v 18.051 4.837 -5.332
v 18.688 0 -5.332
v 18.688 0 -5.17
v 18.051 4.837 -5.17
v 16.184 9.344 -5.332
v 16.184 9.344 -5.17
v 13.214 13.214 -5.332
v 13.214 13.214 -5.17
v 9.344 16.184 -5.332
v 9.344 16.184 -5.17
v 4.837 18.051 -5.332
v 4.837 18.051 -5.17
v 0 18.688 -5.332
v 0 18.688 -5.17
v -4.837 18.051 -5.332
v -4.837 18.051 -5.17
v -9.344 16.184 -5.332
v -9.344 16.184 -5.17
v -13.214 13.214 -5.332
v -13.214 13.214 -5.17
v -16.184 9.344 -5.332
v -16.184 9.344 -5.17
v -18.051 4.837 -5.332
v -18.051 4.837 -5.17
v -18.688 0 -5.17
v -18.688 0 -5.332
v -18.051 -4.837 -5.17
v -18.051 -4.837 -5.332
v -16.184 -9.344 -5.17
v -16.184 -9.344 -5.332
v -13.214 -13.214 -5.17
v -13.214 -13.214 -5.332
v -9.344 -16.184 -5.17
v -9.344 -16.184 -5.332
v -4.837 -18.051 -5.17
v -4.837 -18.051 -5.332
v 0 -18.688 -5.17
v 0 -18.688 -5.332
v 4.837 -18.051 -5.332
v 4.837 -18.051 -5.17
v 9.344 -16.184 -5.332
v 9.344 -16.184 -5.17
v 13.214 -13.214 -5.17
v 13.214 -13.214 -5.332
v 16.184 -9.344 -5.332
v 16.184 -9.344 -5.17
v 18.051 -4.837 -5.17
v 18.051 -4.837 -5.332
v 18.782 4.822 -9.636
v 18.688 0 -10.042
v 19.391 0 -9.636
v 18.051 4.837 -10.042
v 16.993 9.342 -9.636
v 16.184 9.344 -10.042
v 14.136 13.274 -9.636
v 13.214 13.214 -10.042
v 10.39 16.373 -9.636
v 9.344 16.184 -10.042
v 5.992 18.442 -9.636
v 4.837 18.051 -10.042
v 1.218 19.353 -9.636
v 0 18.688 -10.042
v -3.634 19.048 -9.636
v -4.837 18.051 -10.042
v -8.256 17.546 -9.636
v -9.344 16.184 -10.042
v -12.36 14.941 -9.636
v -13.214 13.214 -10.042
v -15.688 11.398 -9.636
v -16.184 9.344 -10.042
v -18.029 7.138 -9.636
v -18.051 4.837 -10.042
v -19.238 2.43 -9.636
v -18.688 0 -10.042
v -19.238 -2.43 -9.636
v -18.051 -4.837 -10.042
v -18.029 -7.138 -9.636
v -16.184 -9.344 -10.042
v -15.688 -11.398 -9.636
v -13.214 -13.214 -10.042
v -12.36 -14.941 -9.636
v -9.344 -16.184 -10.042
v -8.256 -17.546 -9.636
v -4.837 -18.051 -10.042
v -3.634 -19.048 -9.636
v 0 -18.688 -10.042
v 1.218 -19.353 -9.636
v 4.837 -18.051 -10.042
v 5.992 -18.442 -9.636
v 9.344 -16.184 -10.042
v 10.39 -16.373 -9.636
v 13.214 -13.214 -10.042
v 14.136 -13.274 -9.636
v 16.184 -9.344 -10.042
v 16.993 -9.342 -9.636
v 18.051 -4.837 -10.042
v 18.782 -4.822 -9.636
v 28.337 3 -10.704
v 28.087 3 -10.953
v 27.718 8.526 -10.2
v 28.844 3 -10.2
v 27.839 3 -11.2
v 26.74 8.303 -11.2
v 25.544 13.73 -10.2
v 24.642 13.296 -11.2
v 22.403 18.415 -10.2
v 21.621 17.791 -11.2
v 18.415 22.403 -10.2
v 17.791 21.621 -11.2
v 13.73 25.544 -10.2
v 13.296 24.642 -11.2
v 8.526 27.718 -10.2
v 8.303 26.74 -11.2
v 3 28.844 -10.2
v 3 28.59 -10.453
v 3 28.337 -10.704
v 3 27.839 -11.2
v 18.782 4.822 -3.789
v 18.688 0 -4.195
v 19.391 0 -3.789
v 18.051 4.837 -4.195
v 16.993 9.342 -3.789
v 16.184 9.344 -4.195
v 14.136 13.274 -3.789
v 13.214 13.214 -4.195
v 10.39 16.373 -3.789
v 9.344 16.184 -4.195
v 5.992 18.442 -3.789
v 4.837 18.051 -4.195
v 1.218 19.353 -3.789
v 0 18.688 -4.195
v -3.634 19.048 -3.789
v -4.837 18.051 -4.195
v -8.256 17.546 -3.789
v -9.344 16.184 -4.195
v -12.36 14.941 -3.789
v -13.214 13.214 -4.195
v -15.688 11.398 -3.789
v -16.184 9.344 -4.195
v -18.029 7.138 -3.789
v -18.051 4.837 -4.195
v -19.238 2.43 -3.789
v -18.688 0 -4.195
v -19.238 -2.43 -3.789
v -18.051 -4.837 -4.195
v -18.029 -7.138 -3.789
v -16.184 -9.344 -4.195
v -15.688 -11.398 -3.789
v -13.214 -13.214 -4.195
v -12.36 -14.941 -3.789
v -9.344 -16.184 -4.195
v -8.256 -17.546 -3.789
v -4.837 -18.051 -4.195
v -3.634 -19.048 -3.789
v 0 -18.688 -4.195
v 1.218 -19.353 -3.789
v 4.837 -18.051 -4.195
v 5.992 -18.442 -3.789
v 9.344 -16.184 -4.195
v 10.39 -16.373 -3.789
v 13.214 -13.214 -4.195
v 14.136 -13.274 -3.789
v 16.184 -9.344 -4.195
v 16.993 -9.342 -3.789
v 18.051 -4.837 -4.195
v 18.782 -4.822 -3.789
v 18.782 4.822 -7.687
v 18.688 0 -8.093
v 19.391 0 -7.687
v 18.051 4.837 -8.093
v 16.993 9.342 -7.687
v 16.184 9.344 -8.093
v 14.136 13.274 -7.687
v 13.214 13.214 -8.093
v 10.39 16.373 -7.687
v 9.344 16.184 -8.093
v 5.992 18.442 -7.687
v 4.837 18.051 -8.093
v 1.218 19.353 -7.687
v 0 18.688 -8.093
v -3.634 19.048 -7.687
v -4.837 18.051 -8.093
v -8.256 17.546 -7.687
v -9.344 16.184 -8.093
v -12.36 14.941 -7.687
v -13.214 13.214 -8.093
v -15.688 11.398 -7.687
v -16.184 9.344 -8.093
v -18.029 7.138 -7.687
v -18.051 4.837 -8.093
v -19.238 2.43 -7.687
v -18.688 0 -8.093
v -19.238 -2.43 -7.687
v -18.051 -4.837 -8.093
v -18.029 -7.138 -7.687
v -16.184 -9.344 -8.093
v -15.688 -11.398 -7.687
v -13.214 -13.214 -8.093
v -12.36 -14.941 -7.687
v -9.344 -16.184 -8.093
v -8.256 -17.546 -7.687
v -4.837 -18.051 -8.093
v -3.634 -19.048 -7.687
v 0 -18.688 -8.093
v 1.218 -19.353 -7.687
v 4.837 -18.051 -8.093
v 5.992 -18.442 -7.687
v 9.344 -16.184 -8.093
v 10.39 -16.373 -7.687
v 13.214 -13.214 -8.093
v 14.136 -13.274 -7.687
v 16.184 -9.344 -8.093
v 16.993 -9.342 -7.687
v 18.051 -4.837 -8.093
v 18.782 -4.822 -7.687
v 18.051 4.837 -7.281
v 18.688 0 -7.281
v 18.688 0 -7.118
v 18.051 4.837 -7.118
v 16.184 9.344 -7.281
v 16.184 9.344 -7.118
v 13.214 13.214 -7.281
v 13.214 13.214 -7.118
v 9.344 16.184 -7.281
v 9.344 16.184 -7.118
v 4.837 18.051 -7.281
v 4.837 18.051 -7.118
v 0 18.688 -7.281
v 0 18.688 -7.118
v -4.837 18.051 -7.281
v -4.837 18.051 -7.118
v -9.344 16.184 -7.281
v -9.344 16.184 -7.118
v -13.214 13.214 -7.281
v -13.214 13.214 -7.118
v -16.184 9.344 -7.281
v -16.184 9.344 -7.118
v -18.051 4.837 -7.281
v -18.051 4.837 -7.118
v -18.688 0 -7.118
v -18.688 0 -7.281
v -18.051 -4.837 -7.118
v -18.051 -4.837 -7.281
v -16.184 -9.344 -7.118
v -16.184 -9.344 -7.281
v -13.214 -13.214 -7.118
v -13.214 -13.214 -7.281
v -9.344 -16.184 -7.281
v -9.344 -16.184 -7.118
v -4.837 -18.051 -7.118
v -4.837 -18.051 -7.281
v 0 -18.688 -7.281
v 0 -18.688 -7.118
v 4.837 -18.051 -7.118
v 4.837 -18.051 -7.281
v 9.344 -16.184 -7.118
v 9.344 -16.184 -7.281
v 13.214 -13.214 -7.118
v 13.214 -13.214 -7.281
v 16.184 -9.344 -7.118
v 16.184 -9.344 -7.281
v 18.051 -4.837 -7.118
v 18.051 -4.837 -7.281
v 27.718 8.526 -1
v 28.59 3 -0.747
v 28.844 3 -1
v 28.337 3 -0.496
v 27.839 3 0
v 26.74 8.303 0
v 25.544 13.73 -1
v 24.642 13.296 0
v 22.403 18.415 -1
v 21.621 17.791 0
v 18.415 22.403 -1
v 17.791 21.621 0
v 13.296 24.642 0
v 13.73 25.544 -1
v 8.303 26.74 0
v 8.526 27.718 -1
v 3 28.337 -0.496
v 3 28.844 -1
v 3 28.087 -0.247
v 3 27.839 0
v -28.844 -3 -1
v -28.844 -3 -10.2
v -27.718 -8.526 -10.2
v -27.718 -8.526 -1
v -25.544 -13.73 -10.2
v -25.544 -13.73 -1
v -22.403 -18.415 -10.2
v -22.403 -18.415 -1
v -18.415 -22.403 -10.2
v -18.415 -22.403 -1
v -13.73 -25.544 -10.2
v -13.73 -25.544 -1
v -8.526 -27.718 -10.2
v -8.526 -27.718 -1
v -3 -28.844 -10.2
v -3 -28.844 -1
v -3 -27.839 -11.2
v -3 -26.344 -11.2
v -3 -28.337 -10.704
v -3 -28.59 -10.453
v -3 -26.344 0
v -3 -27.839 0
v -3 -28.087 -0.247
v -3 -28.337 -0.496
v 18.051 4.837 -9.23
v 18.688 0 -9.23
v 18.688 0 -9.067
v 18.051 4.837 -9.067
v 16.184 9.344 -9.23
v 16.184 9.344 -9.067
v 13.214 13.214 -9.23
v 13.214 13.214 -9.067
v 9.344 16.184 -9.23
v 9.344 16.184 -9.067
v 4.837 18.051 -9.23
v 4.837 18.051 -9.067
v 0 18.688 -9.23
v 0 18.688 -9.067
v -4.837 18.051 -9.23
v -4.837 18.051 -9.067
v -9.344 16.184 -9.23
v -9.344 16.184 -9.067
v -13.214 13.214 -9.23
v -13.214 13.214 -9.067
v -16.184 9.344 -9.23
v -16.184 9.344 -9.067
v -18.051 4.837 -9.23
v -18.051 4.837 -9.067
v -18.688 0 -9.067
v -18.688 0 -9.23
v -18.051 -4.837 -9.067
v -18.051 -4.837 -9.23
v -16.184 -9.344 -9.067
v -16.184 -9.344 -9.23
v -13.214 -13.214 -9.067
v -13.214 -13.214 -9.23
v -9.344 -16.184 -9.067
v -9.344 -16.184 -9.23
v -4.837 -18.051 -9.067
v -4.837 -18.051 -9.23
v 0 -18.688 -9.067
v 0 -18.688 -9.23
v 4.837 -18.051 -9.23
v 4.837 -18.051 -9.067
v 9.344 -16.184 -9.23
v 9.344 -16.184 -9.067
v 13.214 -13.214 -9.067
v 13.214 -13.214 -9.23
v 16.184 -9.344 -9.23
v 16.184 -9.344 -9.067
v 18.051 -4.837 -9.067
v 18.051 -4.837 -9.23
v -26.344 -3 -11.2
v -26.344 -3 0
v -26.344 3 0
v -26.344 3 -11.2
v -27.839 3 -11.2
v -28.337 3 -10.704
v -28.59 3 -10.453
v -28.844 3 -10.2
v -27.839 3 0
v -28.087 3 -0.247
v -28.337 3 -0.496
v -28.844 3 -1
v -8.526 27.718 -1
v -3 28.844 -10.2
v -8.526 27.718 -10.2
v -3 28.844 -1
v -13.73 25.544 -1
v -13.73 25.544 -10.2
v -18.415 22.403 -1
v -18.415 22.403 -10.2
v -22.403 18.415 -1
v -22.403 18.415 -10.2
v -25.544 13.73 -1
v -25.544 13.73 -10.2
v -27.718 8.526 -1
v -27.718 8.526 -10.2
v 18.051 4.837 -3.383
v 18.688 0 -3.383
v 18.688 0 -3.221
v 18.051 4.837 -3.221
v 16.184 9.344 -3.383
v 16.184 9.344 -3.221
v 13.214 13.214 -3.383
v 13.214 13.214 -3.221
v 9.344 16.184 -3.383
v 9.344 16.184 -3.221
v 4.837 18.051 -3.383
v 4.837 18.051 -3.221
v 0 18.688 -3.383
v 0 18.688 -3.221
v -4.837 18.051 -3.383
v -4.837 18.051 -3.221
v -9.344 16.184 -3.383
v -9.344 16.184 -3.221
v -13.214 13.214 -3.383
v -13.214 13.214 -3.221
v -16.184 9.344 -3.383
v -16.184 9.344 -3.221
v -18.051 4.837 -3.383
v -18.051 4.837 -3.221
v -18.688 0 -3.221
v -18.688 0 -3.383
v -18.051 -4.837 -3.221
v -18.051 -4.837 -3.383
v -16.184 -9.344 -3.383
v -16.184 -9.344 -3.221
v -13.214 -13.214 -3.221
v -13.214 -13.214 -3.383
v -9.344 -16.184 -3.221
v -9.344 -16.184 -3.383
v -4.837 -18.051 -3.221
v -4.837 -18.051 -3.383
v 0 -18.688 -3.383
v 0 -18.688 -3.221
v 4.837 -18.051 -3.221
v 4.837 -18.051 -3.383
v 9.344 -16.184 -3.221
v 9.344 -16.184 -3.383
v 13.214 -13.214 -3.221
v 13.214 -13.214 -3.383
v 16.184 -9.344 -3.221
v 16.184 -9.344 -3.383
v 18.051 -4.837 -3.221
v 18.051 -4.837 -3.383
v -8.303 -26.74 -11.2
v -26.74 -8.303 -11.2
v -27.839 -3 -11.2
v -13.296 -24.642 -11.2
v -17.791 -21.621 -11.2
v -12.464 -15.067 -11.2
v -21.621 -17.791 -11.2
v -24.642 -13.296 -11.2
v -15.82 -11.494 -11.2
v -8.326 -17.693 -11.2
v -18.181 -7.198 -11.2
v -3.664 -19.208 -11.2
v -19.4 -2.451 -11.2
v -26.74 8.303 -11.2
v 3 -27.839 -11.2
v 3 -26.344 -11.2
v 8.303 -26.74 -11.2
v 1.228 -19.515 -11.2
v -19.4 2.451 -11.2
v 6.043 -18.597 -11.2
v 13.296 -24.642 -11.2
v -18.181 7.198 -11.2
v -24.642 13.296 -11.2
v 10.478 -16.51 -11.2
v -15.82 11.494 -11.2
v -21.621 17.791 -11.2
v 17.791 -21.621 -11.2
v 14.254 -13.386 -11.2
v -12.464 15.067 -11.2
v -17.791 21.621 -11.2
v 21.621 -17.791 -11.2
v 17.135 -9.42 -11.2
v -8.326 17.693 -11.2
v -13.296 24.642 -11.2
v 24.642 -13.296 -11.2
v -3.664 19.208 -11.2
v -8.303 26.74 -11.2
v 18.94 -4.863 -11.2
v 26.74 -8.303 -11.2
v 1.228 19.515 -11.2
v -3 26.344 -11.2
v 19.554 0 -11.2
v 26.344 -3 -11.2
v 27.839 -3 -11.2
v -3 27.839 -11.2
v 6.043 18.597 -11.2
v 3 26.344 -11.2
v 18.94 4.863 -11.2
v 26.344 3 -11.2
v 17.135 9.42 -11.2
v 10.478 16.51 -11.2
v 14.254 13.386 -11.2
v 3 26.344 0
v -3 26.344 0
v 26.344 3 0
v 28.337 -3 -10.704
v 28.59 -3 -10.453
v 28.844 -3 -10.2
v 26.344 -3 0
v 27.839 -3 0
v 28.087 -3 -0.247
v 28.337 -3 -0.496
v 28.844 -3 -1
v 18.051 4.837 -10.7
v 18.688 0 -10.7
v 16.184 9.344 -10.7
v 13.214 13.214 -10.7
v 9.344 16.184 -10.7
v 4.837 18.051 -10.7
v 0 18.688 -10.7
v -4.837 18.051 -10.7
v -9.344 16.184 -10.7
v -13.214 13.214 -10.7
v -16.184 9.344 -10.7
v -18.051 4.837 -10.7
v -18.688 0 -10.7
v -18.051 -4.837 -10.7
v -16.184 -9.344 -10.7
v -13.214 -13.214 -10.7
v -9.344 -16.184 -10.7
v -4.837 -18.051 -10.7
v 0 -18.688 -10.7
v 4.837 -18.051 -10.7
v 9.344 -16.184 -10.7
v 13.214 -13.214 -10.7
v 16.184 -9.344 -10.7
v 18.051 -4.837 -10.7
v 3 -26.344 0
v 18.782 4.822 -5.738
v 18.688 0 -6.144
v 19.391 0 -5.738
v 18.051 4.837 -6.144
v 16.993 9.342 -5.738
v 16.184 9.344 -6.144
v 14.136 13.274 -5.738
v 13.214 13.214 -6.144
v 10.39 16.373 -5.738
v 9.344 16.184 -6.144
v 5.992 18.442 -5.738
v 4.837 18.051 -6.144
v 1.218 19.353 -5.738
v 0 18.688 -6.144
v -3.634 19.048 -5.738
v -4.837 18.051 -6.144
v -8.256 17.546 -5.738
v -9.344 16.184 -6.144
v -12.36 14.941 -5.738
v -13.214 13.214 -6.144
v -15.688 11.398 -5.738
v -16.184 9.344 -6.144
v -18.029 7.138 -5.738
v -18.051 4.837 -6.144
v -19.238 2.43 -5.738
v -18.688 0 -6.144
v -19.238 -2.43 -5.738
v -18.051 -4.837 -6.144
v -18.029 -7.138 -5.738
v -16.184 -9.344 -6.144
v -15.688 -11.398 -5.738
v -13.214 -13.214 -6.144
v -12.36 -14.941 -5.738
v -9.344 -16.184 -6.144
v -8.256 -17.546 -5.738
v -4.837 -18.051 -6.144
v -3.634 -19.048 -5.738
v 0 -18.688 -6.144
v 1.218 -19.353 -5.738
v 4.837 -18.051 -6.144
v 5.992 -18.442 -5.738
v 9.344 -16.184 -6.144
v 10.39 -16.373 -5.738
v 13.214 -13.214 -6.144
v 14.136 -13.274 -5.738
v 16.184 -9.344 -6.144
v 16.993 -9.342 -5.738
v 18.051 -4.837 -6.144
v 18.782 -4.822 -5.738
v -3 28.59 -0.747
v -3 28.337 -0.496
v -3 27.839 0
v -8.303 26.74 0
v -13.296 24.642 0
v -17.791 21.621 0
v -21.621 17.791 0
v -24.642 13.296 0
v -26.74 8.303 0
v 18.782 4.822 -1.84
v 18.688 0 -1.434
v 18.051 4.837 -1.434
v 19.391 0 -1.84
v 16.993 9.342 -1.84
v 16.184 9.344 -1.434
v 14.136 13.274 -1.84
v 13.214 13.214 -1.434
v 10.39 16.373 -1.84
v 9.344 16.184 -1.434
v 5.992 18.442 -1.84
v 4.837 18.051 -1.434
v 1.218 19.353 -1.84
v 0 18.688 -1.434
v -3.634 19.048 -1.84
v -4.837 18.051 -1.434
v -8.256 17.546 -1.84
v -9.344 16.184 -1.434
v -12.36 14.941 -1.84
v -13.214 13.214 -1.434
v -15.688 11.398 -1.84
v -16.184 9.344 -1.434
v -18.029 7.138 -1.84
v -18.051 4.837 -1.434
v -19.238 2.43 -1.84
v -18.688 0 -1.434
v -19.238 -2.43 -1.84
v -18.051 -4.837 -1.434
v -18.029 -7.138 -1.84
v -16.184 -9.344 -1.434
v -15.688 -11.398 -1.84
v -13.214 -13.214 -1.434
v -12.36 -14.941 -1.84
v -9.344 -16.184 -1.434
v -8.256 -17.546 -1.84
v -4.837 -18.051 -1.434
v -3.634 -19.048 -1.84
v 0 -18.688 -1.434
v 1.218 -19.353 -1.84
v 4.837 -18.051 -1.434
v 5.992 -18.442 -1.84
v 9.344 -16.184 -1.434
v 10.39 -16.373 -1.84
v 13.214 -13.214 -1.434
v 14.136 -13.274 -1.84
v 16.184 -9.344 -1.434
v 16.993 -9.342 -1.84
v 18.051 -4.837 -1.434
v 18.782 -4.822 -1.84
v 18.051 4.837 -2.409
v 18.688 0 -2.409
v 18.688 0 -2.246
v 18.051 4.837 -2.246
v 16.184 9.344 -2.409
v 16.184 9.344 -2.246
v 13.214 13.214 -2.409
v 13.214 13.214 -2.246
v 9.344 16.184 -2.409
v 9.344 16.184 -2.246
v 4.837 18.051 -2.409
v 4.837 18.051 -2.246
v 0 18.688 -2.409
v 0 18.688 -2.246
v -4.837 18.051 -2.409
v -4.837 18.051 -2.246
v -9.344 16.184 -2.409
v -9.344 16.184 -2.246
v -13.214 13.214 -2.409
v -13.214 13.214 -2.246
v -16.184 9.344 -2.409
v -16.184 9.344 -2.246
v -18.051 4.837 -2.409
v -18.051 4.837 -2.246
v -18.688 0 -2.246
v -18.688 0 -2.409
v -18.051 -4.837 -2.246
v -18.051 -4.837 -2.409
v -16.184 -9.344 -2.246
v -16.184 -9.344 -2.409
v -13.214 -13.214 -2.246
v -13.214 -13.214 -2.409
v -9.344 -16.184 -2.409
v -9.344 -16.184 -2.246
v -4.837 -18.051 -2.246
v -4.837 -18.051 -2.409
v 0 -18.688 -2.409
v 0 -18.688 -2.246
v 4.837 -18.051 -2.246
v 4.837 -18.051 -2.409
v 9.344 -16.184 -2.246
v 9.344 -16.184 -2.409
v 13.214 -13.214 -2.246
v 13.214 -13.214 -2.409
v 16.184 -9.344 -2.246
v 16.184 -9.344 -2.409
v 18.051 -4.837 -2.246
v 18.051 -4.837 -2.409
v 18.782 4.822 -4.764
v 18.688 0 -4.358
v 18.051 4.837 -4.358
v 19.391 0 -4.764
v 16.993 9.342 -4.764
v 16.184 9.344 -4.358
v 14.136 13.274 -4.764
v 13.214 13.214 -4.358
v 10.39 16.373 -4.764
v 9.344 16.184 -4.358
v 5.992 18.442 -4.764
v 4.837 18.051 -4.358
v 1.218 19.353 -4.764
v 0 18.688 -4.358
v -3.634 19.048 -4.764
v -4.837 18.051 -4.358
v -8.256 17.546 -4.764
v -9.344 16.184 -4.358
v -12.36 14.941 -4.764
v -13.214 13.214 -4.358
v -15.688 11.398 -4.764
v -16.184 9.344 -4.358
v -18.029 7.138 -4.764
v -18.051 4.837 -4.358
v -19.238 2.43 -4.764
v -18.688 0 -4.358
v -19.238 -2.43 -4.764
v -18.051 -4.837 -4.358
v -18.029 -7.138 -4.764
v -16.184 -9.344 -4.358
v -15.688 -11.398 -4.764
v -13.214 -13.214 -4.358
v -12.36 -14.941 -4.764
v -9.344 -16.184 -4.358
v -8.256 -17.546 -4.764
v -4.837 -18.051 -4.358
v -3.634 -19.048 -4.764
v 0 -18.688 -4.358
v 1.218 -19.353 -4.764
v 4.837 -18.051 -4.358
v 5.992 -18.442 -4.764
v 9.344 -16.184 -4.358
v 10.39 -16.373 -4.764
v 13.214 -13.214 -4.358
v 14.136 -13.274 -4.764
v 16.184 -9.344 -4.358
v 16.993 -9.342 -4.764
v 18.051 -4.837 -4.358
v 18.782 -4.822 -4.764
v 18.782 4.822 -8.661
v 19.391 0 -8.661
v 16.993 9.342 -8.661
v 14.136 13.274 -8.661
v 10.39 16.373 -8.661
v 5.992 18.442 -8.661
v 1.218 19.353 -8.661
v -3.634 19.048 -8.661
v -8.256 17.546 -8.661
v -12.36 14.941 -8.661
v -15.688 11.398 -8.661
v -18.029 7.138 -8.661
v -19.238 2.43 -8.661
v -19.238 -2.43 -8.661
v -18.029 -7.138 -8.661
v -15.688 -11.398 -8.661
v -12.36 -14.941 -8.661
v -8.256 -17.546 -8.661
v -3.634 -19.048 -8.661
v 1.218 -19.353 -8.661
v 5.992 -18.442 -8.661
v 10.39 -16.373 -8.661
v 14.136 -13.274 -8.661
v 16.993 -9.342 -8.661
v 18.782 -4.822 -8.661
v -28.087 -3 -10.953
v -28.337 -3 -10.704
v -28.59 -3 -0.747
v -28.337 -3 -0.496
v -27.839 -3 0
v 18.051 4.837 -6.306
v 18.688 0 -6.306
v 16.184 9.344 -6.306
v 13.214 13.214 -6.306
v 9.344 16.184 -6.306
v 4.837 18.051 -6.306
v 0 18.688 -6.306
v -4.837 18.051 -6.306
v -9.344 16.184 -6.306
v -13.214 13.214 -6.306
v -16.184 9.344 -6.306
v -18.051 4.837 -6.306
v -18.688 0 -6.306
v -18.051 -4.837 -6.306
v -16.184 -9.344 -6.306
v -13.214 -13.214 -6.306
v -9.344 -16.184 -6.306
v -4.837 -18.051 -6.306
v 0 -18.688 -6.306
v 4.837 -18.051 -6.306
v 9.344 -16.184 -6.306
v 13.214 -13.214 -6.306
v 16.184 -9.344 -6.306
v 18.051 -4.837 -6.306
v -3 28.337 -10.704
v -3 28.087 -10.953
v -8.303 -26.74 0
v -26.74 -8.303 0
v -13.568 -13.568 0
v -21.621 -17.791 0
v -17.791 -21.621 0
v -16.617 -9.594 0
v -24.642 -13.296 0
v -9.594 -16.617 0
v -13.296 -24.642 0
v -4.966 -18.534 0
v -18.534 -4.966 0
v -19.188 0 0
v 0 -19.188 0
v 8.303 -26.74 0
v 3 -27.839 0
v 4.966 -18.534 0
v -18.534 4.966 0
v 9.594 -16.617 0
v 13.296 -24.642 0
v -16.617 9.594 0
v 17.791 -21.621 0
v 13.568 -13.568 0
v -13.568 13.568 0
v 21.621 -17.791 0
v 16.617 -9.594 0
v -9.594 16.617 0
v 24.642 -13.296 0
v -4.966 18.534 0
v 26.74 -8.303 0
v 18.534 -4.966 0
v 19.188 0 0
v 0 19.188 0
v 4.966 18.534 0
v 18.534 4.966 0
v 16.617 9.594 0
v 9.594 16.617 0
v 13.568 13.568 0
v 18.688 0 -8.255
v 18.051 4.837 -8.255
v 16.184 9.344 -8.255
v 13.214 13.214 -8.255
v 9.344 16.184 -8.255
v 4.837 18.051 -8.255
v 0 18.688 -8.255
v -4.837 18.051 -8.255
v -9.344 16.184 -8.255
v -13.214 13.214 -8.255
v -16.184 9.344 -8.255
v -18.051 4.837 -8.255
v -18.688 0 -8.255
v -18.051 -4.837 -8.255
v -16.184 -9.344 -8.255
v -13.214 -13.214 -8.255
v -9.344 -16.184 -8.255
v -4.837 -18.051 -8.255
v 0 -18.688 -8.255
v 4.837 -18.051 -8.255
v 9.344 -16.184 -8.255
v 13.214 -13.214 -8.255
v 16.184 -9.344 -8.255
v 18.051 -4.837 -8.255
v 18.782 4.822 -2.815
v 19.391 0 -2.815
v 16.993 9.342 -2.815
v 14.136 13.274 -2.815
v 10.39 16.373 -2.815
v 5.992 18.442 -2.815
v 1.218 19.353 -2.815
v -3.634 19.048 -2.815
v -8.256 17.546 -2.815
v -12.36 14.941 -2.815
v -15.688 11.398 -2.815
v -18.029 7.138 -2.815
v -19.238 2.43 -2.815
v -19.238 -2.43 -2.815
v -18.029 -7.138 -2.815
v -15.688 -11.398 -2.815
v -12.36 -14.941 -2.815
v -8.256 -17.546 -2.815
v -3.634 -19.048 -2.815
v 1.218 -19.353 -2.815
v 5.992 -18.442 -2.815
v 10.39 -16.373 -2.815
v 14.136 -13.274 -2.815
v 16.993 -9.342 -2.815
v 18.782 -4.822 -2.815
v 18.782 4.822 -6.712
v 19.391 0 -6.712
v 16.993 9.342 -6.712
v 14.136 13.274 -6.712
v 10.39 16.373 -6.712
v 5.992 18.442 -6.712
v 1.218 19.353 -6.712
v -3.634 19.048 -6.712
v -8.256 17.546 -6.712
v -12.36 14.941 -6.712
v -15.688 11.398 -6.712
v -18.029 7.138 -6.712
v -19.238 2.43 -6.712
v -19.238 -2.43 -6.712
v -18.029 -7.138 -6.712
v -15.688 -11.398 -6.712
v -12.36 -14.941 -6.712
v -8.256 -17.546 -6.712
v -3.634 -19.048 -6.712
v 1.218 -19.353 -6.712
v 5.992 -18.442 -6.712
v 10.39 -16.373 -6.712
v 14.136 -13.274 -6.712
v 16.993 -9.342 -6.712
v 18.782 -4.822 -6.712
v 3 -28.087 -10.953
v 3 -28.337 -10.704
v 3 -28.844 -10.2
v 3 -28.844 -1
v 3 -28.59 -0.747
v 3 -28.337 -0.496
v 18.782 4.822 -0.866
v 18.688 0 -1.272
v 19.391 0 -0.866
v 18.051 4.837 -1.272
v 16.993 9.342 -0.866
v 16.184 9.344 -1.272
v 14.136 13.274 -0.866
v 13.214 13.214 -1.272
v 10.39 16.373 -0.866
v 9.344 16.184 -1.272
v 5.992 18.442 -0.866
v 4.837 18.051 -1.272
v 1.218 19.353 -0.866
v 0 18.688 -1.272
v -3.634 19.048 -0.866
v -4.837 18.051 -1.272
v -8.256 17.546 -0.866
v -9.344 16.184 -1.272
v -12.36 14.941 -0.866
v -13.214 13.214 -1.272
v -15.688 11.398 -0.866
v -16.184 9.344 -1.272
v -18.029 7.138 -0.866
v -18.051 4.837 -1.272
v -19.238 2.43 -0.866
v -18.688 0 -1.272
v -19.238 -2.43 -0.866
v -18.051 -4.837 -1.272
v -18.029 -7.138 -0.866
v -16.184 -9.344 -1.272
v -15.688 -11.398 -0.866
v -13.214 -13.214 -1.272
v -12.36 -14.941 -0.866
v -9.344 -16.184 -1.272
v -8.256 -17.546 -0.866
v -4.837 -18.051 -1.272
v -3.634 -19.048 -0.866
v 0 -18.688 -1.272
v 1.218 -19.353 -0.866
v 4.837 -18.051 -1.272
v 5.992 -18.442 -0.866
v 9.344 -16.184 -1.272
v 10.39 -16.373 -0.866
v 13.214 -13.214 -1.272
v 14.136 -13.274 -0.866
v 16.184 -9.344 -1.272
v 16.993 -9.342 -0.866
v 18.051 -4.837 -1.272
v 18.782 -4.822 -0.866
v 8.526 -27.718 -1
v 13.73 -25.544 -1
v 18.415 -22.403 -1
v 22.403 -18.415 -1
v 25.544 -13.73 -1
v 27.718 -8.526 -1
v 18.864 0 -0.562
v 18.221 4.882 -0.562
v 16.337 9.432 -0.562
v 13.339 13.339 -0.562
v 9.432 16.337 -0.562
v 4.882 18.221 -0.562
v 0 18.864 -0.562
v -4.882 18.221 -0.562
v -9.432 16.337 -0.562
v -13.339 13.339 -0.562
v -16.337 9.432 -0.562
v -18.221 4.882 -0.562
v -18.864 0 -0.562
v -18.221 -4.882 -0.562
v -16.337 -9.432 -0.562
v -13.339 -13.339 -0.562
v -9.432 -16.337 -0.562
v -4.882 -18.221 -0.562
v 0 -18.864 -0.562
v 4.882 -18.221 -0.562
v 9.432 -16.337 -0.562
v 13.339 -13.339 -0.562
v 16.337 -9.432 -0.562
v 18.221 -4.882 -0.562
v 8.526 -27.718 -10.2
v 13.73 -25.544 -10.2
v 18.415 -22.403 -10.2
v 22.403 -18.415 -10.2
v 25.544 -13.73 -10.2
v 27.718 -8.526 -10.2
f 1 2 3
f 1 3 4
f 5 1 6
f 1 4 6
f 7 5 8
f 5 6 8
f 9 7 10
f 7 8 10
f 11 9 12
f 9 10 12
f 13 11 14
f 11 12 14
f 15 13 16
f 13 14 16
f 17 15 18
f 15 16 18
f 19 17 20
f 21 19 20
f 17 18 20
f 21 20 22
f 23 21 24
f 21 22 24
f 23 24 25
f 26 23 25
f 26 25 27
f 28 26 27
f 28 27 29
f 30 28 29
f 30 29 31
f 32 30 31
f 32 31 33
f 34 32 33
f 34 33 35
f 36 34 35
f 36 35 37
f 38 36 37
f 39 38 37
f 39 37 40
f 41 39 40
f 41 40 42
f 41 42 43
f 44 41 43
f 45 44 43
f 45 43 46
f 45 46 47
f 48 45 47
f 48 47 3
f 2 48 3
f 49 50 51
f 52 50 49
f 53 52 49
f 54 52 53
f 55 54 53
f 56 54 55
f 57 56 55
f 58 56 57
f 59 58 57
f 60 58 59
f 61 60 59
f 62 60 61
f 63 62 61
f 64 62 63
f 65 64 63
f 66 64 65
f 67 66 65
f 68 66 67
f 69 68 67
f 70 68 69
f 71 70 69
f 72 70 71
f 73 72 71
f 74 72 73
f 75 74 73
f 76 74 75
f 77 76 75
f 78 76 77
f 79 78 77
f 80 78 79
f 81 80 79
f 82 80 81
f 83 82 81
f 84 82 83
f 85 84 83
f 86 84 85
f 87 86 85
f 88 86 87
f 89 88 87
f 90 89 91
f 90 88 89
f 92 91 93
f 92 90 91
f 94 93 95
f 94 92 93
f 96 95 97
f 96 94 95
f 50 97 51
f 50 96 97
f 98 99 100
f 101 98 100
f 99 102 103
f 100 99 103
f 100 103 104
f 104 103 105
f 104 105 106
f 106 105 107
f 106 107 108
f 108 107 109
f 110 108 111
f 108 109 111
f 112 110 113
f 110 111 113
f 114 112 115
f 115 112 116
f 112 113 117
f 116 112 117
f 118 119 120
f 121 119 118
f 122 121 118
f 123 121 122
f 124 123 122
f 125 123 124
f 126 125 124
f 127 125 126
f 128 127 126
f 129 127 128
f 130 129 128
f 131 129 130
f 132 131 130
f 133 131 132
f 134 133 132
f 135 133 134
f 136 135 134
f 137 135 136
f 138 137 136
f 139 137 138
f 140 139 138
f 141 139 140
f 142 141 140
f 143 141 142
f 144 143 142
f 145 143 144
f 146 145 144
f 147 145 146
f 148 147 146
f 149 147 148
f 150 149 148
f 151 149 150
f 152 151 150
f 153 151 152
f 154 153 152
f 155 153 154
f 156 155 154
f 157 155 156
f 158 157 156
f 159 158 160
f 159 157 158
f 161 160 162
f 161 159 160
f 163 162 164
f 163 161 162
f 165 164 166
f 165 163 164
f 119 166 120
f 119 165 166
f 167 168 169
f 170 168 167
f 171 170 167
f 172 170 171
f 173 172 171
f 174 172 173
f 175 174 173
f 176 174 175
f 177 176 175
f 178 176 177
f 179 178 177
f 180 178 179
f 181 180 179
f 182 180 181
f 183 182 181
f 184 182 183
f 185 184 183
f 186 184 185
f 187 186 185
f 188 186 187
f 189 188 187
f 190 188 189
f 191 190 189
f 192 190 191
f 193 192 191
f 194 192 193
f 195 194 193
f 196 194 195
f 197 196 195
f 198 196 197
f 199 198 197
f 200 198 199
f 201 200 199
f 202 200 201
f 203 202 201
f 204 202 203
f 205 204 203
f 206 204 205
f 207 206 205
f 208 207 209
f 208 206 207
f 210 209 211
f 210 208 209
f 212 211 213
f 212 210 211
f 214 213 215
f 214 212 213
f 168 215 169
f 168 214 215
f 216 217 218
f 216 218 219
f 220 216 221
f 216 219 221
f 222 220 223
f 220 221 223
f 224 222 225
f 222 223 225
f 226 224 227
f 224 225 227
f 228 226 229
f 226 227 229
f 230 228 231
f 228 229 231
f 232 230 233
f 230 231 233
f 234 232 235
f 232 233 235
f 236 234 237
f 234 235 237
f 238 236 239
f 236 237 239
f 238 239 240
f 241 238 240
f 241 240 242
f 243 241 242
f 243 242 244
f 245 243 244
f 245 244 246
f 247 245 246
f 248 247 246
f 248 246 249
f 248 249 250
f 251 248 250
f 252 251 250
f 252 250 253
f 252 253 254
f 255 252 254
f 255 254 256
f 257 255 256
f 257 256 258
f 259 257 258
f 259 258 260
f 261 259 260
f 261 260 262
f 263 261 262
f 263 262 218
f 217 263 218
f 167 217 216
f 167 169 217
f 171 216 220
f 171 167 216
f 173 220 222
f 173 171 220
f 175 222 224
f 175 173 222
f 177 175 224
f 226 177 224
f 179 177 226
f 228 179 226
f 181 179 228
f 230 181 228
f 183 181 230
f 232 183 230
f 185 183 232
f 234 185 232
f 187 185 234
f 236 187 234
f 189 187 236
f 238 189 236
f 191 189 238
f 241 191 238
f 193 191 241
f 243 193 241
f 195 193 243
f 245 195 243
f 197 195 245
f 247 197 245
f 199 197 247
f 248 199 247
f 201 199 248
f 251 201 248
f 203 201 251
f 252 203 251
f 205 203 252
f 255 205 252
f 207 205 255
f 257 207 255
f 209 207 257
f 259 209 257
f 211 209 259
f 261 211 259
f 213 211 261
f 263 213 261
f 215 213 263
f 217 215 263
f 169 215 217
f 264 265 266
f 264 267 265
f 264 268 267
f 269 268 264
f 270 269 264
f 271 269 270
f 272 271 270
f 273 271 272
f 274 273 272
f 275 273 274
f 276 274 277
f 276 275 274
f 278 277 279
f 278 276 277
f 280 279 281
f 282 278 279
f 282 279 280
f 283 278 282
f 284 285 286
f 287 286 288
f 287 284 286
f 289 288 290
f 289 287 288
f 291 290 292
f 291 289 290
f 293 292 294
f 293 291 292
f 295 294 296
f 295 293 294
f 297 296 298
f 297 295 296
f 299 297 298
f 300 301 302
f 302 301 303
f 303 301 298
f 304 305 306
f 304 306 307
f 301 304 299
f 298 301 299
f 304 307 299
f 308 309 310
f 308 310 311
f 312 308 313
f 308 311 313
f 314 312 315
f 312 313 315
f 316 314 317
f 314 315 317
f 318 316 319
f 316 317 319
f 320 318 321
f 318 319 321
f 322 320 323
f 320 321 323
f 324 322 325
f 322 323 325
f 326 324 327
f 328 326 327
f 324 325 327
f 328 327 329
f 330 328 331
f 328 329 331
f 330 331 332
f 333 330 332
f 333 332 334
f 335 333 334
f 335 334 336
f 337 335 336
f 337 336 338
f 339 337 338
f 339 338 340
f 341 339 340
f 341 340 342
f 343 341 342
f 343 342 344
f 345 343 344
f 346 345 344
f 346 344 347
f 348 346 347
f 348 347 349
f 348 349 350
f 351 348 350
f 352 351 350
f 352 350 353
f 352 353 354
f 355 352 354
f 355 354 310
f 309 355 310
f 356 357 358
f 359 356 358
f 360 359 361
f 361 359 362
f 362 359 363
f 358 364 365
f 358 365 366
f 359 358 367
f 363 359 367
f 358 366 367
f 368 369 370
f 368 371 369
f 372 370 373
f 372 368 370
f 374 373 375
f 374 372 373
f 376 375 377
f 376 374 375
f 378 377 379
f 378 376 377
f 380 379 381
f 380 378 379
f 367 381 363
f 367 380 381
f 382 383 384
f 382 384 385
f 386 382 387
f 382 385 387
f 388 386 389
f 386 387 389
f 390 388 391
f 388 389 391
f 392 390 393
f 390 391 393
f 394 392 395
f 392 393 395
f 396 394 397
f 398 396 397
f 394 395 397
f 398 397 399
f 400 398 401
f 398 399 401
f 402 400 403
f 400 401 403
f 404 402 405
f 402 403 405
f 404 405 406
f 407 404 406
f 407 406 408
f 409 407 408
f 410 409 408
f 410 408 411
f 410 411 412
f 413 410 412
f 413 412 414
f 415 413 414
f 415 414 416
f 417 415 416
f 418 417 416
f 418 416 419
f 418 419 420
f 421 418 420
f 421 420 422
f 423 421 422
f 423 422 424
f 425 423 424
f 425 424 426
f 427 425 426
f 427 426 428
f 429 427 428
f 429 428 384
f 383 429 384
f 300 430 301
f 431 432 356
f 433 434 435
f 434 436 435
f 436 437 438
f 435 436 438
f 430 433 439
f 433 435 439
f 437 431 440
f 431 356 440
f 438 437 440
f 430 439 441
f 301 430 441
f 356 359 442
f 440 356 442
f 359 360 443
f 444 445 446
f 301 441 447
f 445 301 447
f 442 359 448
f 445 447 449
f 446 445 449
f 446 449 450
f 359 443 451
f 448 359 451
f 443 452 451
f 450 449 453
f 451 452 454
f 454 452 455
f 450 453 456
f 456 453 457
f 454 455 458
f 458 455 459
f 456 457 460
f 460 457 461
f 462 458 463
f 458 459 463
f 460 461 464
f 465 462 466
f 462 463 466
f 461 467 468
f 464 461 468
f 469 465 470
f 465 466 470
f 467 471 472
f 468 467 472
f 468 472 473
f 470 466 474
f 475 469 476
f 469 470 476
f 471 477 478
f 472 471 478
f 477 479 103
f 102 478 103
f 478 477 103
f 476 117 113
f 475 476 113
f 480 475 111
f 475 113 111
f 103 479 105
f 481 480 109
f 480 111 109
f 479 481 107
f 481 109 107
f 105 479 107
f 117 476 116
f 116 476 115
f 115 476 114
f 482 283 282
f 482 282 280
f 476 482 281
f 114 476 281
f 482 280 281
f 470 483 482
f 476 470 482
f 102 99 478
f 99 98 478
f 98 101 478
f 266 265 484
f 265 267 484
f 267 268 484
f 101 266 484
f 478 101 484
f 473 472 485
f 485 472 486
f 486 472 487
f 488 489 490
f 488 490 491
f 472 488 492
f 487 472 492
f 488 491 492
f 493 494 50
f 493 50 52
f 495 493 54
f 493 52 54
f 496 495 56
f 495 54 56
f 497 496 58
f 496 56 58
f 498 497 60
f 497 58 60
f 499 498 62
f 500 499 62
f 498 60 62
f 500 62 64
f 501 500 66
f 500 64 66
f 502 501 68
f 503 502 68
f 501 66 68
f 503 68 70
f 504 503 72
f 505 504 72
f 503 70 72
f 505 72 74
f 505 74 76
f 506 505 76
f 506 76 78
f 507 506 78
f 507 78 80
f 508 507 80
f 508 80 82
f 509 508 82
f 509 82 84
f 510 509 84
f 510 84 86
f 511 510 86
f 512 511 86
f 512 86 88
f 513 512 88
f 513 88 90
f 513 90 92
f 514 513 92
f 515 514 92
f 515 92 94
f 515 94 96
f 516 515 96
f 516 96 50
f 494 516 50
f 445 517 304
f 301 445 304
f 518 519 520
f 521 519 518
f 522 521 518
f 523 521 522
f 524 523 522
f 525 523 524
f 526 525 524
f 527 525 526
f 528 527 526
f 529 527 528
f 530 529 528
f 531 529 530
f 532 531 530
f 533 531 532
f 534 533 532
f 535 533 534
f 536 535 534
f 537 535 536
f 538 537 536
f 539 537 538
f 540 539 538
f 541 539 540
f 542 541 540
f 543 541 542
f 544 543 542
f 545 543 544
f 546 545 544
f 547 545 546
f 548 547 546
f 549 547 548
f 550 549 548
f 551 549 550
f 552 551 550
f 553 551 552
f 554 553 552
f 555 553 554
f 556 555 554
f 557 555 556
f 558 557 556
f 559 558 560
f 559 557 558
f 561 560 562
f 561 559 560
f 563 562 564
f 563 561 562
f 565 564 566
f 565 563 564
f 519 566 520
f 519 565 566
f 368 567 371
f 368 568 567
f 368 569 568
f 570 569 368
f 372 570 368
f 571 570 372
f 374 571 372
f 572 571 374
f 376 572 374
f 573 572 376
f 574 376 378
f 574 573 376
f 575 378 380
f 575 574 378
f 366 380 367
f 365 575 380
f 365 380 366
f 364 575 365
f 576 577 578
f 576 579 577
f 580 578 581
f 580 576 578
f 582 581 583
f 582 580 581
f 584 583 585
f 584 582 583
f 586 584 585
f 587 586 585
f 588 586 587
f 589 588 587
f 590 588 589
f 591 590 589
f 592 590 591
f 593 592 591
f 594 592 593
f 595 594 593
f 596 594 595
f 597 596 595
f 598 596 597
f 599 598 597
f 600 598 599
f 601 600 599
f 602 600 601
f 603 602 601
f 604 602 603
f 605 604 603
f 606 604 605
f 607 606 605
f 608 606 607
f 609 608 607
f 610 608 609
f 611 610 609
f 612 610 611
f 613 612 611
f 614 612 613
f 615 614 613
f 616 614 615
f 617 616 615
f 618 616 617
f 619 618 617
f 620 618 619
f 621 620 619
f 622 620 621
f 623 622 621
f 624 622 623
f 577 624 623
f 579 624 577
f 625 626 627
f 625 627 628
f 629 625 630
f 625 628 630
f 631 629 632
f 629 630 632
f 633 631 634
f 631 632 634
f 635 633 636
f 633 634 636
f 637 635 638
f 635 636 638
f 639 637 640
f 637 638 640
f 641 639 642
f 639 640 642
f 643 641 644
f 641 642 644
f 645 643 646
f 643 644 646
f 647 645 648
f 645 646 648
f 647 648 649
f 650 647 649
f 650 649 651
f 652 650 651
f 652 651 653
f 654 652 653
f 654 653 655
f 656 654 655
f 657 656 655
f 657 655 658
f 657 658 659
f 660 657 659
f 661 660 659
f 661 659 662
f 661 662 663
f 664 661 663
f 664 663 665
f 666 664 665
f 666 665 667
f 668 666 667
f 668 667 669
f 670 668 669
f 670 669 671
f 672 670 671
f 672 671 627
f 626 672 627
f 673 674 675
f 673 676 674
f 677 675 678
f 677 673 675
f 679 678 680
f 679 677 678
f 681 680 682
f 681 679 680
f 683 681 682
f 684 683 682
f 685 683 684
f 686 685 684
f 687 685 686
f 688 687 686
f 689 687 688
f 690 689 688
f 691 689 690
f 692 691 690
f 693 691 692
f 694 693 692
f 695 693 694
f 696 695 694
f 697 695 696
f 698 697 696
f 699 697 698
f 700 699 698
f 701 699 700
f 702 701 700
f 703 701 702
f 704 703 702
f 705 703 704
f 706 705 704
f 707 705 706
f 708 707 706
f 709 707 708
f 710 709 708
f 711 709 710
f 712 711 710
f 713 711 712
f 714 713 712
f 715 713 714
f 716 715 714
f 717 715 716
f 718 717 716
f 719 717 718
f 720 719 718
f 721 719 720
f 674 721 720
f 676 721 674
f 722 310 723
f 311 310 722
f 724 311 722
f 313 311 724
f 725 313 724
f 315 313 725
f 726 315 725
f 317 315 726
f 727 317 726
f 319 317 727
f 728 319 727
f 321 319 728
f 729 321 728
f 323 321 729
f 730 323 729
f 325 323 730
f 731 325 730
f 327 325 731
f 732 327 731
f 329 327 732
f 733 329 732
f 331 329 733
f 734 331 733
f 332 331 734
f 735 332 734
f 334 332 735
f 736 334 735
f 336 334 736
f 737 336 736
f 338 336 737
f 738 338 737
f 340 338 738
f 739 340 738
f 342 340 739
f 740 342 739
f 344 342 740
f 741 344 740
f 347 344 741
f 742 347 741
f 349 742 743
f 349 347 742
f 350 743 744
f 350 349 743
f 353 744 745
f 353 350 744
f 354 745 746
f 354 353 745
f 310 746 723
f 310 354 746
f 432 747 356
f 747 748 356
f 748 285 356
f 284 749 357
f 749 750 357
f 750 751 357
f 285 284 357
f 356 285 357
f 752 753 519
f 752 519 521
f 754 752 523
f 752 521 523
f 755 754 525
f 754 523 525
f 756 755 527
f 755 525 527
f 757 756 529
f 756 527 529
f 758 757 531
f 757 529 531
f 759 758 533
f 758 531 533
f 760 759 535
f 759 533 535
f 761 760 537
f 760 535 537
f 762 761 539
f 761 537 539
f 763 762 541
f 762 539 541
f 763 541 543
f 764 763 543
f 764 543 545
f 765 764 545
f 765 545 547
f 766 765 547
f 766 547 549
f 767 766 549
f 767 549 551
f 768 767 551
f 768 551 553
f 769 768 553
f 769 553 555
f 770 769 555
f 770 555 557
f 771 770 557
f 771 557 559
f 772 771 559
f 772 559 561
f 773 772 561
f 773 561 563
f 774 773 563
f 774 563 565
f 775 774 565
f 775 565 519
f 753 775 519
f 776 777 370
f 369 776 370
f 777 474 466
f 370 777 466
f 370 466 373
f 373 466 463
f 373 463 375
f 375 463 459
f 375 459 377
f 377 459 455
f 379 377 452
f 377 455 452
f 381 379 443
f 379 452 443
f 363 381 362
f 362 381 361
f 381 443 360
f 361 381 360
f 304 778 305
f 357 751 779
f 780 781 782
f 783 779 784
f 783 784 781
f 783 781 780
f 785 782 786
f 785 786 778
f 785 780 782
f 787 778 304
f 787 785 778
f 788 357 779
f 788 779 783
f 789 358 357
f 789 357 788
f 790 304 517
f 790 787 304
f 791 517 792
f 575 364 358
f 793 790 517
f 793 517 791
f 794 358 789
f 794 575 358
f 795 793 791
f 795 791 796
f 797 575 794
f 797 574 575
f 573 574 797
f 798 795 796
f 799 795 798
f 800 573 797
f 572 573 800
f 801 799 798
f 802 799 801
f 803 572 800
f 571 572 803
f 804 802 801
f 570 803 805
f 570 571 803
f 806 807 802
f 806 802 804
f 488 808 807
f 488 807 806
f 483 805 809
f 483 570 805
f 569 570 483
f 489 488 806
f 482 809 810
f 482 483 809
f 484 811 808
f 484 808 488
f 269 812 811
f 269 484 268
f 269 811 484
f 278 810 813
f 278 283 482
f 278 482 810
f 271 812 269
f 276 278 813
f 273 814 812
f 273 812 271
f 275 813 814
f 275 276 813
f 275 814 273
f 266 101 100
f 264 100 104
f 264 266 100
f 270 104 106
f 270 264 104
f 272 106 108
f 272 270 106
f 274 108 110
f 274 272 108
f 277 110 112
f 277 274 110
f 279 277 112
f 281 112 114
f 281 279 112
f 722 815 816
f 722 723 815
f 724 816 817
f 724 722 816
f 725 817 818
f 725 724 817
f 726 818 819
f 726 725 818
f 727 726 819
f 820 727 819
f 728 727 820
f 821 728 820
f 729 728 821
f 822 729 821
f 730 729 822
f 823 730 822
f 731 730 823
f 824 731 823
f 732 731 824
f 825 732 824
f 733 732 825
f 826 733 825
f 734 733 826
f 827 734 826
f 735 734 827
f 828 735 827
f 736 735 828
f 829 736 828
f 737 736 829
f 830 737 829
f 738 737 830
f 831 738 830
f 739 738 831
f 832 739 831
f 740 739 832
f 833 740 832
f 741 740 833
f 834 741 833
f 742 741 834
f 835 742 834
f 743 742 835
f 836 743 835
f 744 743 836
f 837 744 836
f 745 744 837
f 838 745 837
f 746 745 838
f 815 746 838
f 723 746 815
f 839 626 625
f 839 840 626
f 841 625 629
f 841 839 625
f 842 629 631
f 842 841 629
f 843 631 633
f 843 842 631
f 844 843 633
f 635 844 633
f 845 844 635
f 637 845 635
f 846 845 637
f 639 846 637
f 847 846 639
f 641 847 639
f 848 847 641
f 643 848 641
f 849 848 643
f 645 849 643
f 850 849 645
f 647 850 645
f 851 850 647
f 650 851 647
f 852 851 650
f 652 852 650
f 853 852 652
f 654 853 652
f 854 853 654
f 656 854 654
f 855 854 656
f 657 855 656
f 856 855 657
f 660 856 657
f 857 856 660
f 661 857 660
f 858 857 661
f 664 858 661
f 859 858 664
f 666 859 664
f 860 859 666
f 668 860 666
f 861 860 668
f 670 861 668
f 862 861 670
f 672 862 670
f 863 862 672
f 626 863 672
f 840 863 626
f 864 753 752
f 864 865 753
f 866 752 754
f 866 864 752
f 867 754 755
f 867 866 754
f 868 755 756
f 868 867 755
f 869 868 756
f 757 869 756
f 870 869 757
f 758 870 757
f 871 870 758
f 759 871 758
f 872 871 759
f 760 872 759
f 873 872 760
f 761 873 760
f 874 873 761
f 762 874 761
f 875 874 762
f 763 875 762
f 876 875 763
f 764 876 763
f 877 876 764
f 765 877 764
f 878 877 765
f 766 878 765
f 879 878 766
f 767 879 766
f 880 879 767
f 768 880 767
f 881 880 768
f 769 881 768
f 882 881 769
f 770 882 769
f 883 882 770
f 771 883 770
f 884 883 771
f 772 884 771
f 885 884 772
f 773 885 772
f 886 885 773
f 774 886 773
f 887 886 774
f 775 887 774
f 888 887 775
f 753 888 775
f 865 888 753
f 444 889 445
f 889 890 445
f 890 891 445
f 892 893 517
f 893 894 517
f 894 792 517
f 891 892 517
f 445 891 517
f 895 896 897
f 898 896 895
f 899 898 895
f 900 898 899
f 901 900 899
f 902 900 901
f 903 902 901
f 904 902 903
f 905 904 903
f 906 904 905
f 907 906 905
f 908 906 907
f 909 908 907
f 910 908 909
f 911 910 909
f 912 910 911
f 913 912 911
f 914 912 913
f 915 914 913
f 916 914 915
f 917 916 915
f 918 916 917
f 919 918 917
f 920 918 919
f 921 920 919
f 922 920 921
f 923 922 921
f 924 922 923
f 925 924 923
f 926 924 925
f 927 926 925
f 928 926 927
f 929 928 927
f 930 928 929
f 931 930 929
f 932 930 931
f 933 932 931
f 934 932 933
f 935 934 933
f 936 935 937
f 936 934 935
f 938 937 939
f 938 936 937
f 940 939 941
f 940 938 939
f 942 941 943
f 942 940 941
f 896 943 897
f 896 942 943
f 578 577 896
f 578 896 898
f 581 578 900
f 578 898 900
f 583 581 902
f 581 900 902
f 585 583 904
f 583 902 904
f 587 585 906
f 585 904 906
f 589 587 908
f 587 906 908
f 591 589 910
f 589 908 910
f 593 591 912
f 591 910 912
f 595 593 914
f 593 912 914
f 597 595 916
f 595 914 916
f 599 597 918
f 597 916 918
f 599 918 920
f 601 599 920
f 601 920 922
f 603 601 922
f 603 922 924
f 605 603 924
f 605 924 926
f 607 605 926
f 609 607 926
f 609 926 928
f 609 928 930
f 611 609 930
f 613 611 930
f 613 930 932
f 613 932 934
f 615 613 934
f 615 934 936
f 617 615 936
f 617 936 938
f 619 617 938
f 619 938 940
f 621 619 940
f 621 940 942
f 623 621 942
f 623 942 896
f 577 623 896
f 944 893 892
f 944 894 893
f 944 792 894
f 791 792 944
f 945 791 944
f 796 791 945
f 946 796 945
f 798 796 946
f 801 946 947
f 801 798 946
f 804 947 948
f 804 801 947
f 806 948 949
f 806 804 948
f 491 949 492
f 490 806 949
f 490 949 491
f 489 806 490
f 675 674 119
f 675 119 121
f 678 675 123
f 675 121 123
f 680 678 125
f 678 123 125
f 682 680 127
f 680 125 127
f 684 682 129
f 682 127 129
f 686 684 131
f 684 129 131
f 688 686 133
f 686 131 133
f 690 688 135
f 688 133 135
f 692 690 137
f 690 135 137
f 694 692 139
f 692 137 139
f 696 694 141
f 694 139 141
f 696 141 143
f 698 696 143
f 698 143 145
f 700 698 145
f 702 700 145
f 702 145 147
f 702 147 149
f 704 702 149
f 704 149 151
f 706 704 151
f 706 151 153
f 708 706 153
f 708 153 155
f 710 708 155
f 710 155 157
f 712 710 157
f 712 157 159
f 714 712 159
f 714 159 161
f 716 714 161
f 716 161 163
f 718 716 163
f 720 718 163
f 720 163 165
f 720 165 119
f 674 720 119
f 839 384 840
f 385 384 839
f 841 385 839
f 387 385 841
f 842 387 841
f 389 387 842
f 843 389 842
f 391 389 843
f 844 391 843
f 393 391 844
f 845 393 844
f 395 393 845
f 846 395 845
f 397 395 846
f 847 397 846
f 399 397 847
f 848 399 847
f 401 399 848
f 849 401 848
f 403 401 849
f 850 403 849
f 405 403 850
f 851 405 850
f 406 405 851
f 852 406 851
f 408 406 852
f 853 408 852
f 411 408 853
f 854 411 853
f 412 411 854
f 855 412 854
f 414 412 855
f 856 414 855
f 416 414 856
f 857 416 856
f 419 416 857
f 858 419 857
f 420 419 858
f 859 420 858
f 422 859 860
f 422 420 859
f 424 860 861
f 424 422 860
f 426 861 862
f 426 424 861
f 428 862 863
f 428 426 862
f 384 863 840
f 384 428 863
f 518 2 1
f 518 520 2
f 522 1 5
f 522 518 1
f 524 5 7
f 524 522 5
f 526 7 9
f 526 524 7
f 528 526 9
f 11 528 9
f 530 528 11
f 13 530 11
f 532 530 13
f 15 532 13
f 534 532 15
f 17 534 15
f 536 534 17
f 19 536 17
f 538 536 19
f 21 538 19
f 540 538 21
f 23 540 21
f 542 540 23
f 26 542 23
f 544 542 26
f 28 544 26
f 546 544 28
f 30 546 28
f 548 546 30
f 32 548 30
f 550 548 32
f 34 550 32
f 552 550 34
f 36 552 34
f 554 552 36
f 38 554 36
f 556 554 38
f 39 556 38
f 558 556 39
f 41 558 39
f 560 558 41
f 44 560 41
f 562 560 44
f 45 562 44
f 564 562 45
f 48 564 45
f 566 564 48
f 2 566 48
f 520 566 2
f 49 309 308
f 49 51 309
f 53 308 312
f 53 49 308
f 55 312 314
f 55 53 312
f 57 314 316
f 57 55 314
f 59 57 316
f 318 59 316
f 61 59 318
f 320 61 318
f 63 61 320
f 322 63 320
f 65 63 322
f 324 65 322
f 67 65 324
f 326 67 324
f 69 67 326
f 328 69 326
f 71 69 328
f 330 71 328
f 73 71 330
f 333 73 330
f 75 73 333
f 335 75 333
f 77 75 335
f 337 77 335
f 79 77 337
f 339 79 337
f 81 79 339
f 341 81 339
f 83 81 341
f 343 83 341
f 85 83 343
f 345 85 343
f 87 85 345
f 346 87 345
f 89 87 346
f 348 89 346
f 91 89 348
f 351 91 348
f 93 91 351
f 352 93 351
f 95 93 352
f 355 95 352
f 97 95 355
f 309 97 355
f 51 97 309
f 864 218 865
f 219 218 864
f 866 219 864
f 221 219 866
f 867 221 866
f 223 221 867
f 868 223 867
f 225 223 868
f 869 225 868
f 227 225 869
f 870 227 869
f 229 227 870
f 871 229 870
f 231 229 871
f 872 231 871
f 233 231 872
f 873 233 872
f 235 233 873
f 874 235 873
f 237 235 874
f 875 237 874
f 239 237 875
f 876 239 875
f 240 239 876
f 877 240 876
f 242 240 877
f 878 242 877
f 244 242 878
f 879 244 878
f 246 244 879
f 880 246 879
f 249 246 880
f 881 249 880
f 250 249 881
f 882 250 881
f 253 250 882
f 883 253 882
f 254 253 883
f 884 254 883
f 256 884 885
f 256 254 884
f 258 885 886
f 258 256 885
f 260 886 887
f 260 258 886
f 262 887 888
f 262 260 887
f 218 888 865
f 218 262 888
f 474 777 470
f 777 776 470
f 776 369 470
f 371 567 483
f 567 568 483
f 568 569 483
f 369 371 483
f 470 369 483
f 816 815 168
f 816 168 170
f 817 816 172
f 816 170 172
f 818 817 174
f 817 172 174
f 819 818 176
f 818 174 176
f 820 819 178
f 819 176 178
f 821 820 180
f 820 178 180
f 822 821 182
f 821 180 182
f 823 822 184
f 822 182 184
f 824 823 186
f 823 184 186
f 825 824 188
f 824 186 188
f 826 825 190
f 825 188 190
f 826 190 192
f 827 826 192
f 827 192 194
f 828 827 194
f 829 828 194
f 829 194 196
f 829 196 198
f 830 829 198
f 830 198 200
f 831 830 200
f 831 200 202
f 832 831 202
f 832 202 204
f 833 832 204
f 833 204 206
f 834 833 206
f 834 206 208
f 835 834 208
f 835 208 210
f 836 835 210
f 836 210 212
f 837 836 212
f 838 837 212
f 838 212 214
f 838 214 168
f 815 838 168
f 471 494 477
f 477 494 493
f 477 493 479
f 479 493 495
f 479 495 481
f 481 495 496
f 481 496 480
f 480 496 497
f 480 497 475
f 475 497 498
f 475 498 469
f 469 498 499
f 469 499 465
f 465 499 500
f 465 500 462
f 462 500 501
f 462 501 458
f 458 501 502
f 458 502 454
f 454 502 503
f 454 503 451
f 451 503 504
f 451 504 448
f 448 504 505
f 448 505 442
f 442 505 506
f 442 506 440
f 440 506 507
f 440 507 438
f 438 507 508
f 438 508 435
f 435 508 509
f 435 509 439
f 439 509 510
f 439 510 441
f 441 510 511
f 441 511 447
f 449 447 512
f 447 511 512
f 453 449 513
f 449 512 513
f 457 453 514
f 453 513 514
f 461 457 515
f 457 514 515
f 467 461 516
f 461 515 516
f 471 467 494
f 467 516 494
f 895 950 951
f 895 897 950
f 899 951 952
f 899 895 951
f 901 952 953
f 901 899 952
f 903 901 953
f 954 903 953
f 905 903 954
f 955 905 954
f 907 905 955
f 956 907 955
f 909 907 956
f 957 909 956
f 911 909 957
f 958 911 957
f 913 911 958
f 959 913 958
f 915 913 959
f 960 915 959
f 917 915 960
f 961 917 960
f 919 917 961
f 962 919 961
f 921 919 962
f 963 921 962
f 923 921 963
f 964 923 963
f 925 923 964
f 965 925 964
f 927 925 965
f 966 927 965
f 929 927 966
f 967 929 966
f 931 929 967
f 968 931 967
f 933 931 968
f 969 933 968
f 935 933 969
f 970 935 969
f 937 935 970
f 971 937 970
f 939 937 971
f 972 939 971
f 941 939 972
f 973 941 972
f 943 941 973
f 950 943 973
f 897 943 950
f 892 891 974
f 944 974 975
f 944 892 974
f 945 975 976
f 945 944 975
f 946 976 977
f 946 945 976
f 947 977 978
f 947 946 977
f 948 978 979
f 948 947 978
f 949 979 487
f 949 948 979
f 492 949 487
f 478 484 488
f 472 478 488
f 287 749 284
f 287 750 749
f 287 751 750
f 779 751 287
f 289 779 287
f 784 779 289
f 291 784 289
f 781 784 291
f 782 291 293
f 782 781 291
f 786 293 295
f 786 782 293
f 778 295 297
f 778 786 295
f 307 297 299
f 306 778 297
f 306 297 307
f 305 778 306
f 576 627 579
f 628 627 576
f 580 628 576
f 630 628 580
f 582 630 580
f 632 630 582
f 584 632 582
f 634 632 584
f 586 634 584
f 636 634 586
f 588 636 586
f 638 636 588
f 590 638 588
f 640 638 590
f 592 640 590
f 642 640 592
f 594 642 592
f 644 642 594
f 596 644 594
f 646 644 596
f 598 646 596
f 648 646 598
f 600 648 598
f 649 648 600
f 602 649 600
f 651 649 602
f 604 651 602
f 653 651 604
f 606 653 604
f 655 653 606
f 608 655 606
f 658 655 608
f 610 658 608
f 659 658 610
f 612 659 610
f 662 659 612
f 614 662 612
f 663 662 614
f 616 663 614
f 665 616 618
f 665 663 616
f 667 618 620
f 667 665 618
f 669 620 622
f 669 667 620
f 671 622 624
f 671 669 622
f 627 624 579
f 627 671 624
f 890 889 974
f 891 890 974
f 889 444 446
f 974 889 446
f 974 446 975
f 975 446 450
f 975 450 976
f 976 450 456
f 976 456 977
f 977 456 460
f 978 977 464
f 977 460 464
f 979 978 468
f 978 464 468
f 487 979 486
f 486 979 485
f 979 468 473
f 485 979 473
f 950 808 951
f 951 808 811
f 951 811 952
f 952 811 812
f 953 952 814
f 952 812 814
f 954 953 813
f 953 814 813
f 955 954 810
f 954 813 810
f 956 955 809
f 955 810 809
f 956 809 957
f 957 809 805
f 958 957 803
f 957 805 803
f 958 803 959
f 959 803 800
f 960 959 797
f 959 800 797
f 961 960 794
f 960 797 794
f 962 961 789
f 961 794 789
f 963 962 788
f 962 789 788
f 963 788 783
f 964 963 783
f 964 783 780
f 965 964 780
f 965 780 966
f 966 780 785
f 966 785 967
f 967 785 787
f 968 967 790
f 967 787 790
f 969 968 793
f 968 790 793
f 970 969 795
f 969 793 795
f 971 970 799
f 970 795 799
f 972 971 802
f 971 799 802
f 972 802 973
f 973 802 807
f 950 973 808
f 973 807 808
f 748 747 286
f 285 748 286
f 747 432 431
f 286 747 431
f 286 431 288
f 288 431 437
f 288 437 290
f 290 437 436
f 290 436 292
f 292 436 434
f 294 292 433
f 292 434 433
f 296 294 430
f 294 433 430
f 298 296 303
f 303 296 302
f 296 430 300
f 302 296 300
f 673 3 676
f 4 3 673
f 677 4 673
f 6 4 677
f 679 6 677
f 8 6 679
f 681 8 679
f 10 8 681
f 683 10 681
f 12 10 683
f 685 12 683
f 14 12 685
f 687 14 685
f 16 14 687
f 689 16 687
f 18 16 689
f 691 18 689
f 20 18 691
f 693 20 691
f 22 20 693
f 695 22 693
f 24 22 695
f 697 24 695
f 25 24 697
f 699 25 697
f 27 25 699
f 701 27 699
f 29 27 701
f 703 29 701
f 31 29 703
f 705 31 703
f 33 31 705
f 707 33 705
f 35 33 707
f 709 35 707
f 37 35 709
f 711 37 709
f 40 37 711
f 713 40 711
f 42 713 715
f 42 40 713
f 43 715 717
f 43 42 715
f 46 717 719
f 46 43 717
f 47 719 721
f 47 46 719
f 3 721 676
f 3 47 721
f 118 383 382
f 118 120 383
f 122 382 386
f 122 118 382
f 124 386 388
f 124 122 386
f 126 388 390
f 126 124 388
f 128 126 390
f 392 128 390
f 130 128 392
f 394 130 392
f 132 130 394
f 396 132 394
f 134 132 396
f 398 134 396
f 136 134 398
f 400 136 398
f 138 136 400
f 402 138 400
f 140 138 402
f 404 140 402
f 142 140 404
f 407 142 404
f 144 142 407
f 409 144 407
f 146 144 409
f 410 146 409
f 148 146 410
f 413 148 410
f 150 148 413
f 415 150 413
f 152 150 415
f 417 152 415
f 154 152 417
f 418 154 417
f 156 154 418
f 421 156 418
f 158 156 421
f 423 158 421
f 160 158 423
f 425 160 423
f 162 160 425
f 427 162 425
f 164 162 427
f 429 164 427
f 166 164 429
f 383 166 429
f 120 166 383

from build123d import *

# Parameters (mm, degrees)
SKETCH2_R               = 29
BASENUT_DEPTH           = 11.2
CHAMFER1_SIZE           = 1
SKETCH3_R               = 18.688
HOLE_DEPTH              = 12.2
ENDCHAMFER_SIZE2        = 0.5
ENDCHAMFER_SIZE         = 0.866025404
ENDCHAMFER_EDGE_2_SIZE2 = 0.5
ENDCHAMFER_EDGE_2_SIZE  = 0.866025404
SLOTCUT_DEPTH           = 12.2
SLOTPAT_COUNT           = 4
LPATTERN10_COUNT        = 10
LPATTERN10_PITCH        = 0.9744


with BuildPart() as part:
    # Sketch2 → BaseNut (new body)
    with BuildSketch(Plane.XY):
        Circle(SKETCH2_R)
    extrude(amount=-BASENUT_DEPTH)

    # Chamfer1
    chamfer1_edges = [part.edges().sort_by_distance(p)[0] for p in [
        (-29, 0, 0),
        (-29, 0, -11.2),
    ]]
    chamfer(chamfer1_edges, length=CHAMFER1_SIZE)

    # Sketch3 → Hole (cut, through all)
    with BuildSketch(Plane(origin=(-17.561722019, 31.682666601, 0), x_dir=(1, 0, 0), z_dir=(0, 0, 1))):
        with Locations((17.561722019, -31.682666601)):
            Circle(SKETCH3_R)
    extrude(amount=-HOLE_DEPTH, mode=Mode.SUBTRACT)

    # EndChamfer
    endchamfer_edges = [part.edges().sort_by_distance(p)[0] for p in [
        (-18.688, 0, -11.2),
    ]]
    chamfer(endchamfer_edges, length=ENDCHAMFER_SIZE, length2=ENDCHAMFER_SIZE2)

    # EndChamfer edge 2
    endchamfer_edge_2_edges = [part.edges().sort_by_distance(p)[0] for p in [
        (-18.688, 0, 0),
    ]]
    chamfer(endchamfer_edge_2_edges, length=ENDCHAMFER_EDGE_2_SIZE, length2=ENDCHAMFER_EDGE_2_SIZE2)

    # Sketch4 → SlotCut (cut, through all)
    with BuildSketch(Plane(origin=(-28.84840977, 49.266341409, 0), x_dir=(1, 0, 0), z_dir=(0, 0, 1))):
        with BuildLine():
            Line((25.84840977, -20.421931205), (25.84840977, -22.921931205))
            Line((25.84840977, -22.921931205), (31.84840977, -22.921931205))
            Line((31.84840977, -22.921931205), (31.84840977, -20.421931205))
            ThreePointArc((31.84840977, -20.421931205), (28.84840977, -20.266341409), (25.84840977, -20.421931205))
        make_face()
    slotcut = extrude(amount=-SLOTCUT_DEPTH, mode=Mode.SUBTRACT)

    # SlotPat: SlotCut ×4 about axis
    slotpat_axis = Axis((0, 0, 0), (0, 0, 1))
    for i in range(1, SLOTPAT_COUNT):
        add(slotcut.rotate(slotpat_axis, i * 360 / SLOTPAT_COUNT), mode=Mode.SUBTRACT)

    # Sketch5 → Cut-Revolve10 (revolve, cut)
    with BuildSketch(Plane(origin=(0, 0, 0), x_dir=(1, 0, 0), z_dir=(0, 1, 0))):
        Polygon((17.876, 1.272025404), (17.876, 0.460025404), (18.688, 0.460025404), (19.391212628, 0.866025404), (18.688, 1.272025404), align=None)
    cut_revolve10 = revolve(axis=Axis((0, 0, -37.301805437), (0, 0, 1)), mode=Mode.SUBTRACT)

    # LPattern10: Cut-Revolve10 ×10
    with Locations(*[(0, 0, -i * LPATTERN10_PITCH) for i in range(1, LPATTERN10_COUNT)]):
        add(cut_revolve10, mode=Mode.SUBTRACT)


solid = part.part
